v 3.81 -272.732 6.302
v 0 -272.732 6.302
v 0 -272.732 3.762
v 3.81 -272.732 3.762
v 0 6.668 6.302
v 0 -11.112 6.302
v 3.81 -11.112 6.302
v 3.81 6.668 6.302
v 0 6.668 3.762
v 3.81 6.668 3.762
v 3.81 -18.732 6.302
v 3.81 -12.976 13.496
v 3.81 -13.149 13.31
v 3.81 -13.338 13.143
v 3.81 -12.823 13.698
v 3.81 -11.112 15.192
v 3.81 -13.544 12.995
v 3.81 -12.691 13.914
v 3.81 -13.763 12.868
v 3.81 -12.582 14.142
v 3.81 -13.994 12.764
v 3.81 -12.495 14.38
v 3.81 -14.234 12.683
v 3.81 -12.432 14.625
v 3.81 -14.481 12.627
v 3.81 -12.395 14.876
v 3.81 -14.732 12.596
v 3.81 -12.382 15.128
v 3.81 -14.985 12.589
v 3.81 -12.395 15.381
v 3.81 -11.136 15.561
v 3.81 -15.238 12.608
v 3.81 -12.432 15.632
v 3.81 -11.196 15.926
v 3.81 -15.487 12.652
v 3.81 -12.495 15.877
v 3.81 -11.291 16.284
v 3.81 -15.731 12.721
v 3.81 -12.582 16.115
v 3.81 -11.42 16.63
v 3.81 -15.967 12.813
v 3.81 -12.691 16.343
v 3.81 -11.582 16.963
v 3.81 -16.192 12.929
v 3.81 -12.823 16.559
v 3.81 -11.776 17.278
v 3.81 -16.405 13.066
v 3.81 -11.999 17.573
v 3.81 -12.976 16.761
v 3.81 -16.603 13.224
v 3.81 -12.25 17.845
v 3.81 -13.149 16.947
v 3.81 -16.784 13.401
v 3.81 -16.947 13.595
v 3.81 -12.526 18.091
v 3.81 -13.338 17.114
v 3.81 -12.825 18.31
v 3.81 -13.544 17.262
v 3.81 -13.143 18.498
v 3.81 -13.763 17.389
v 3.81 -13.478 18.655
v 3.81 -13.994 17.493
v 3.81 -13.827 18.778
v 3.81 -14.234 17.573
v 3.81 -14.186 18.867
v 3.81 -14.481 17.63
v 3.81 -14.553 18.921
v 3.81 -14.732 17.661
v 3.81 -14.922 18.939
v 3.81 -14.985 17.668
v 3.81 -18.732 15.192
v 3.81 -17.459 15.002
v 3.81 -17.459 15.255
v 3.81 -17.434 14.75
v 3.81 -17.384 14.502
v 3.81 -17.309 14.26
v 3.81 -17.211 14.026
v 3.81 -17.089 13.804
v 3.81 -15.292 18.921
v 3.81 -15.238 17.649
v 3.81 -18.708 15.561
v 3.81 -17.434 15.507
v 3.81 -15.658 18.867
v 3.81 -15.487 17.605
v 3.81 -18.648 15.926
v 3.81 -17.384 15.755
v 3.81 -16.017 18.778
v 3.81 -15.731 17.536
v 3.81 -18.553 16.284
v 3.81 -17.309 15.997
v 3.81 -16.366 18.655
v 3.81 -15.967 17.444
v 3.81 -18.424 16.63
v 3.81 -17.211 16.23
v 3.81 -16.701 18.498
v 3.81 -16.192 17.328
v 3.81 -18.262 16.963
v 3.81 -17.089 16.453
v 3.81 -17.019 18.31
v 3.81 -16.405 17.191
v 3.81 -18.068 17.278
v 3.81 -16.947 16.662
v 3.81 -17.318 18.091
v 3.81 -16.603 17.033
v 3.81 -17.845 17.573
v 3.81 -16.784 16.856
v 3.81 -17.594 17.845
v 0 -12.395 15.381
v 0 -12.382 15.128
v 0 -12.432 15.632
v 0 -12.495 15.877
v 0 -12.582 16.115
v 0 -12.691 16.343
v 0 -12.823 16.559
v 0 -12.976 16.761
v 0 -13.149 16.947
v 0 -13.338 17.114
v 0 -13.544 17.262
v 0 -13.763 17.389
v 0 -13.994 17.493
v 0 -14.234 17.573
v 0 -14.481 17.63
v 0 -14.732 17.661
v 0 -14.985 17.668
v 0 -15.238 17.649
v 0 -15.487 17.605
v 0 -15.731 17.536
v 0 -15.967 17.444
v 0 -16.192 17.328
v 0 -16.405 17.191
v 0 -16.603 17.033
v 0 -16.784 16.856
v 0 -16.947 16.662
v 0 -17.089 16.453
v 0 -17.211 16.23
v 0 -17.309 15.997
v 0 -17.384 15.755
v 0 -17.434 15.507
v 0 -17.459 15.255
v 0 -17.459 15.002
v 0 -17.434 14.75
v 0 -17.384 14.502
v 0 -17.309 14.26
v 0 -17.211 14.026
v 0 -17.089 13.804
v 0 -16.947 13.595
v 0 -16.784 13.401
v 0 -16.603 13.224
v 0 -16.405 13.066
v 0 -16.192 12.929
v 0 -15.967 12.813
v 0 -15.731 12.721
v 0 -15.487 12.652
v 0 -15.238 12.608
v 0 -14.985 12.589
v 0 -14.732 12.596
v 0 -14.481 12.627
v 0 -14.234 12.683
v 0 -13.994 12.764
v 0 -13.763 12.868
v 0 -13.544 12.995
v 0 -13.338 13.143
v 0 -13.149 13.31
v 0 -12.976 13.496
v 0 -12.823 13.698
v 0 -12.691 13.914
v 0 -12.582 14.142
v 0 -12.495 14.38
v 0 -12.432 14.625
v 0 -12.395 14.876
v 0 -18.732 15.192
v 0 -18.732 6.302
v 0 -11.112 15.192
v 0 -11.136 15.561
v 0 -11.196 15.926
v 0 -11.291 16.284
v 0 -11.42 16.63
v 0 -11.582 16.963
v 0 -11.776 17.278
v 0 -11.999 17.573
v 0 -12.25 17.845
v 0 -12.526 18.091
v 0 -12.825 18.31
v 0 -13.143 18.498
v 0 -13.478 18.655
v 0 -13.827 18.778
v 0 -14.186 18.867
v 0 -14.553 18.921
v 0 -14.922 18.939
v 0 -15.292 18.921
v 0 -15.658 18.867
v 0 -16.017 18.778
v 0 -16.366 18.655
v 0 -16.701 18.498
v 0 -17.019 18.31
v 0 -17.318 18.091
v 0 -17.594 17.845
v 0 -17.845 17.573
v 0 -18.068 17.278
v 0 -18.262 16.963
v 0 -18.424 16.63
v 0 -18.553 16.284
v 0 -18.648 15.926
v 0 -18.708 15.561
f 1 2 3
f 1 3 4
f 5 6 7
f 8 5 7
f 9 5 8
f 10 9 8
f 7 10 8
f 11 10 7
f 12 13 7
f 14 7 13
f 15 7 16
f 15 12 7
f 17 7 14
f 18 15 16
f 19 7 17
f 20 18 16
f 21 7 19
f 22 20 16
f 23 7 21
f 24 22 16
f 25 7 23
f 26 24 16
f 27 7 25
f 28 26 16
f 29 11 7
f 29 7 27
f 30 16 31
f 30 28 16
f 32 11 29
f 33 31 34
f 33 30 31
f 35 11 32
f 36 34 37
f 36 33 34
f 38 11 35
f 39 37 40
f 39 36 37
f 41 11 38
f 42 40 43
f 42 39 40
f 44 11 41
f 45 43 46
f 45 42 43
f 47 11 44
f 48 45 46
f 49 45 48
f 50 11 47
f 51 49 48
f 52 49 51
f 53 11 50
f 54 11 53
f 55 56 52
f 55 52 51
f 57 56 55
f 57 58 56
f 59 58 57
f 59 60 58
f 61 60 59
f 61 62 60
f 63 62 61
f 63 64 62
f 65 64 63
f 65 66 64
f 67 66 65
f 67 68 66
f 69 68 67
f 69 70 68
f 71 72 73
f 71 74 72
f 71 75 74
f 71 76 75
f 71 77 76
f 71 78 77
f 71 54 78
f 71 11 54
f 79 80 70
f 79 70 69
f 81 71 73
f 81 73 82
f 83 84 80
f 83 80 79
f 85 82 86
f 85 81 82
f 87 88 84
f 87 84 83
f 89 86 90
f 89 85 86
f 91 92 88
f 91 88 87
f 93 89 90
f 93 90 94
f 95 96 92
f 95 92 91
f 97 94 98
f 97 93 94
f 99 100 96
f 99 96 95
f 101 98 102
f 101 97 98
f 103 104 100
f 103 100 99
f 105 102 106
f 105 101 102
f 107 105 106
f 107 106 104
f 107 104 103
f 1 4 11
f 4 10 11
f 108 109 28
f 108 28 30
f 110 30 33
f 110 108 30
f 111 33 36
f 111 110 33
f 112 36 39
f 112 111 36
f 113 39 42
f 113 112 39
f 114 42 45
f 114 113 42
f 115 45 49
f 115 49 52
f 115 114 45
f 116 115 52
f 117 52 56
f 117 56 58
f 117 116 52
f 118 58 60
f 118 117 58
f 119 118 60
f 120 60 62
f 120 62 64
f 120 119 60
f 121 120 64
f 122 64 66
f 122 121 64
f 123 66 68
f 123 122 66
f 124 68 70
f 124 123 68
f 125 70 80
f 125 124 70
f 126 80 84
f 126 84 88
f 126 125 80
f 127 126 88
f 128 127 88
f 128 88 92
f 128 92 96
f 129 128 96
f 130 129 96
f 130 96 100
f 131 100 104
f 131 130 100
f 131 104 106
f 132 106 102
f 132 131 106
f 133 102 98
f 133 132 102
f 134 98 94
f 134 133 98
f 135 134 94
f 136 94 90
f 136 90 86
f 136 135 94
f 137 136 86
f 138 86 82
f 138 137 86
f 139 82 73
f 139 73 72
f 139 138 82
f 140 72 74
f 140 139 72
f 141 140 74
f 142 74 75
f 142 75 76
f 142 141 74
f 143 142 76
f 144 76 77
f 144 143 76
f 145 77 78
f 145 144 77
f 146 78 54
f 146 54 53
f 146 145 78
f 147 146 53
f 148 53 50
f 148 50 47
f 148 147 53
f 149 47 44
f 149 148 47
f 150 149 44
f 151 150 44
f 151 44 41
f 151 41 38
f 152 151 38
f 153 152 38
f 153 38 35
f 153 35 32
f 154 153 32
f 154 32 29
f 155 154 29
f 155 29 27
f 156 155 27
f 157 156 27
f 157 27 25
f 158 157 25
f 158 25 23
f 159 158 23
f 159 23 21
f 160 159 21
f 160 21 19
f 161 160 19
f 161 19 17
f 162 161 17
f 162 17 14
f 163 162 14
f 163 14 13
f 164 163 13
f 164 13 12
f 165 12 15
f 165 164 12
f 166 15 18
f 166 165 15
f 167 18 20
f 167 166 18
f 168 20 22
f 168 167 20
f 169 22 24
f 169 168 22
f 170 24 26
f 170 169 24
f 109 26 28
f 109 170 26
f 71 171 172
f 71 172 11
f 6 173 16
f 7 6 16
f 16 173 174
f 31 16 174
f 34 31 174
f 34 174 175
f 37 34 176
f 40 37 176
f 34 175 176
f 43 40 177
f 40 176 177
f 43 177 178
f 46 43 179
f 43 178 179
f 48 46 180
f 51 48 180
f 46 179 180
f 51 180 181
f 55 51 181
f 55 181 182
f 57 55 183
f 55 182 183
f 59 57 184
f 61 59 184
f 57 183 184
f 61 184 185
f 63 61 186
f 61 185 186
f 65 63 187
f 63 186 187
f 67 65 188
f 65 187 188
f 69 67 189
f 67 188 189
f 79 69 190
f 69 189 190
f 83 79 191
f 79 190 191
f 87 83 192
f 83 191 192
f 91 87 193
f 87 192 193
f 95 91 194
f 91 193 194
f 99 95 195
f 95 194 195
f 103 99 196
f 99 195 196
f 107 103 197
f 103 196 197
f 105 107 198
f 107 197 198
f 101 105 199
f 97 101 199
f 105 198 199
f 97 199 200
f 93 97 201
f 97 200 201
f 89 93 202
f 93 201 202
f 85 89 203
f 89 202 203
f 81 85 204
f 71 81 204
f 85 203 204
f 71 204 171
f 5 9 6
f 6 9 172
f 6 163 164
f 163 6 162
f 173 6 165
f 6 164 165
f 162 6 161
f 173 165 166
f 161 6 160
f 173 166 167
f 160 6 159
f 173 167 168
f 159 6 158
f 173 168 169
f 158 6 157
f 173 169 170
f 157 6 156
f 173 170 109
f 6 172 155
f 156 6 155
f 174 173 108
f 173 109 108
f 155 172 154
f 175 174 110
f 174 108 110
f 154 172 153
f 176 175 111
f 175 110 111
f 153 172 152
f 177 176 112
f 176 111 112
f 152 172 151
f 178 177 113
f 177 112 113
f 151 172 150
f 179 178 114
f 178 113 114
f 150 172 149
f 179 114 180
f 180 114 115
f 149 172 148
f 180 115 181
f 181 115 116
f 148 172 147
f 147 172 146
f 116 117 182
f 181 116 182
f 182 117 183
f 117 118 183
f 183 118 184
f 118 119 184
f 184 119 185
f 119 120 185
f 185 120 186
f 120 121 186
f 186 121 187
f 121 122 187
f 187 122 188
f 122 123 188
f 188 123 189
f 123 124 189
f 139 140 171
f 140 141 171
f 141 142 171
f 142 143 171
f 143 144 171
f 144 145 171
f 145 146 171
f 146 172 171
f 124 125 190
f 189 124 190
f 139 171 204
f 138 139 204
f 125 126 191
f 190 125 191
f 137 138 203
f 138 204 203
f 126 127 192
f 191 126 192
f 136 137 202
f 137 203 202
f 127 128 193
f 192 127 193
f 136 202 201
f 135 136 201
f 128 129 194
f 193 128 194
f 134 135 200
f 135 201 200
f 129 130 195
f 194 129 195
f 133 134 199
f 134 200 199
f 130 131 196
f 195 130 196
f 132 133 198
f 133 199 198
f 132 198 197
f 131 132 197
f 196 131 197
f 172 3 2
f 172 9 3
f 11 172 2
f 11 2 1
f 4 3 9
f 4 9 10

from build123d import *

# Parameters (mm, degrees)
F0_R          = 2.54
F1_DEPTH      = 3.81
F1_FACE_W     = 3.81
F1_FACE_H     = 7.62
F2_DEPTH      = 7.62
F3_W          = 3.81
F3_H          = 2.54
F4_DEPTH      = 254
F4_DEPTH_BACK = 25.4


with BuildPart() as f1:
    # F0 (on Right) → F1 (new body)
    with BuildSketch(Plane.YZ):
        with BuildLine():
            ThreePointArc((-11.112122, 15.191537), (-14.922122, 18.938949), (-18.732122, 15.191537))
            Line((-18.732122, 15.191537), (-18.732122, 11.381537))
            Line((-18.732122, 11.381537), (-11.112122, 11.381537))
            Line((-11.112122, 11.381537), (-11.112122, 15.191537))
        make_face()
        with Locations((-14.922122, 15.128426)):
            Circle(F0_R, mode=Mode.SUBTRACT)
    extrude(amount=F1_DEPTH)

    # F1_face (on face) → F2 (join)
    with BuildSketch(Plane(origin=(1.905, -14.922122, 11.381537), x_dir=(1, 0, 0), z_dir=(0, 0, -1))):
        Rectangle(F1_FACE_W, F1_FACE_H)
    extrude(amount=F2_DEPTH)

    # F3 (on face) → F4 (join, two sides)
    with BuildSketch(Plane.XZ.offset(18.732122)) as f4_sk:
        with Locations((1.905, 5.031537)):
            Rectangle(F3_W, F3_H)
    extrude(amount=F4_DEPTH)
    extrude(f4_sk.sketch, amount=-F4_DEPTH_BACK)


solid = f1.part
